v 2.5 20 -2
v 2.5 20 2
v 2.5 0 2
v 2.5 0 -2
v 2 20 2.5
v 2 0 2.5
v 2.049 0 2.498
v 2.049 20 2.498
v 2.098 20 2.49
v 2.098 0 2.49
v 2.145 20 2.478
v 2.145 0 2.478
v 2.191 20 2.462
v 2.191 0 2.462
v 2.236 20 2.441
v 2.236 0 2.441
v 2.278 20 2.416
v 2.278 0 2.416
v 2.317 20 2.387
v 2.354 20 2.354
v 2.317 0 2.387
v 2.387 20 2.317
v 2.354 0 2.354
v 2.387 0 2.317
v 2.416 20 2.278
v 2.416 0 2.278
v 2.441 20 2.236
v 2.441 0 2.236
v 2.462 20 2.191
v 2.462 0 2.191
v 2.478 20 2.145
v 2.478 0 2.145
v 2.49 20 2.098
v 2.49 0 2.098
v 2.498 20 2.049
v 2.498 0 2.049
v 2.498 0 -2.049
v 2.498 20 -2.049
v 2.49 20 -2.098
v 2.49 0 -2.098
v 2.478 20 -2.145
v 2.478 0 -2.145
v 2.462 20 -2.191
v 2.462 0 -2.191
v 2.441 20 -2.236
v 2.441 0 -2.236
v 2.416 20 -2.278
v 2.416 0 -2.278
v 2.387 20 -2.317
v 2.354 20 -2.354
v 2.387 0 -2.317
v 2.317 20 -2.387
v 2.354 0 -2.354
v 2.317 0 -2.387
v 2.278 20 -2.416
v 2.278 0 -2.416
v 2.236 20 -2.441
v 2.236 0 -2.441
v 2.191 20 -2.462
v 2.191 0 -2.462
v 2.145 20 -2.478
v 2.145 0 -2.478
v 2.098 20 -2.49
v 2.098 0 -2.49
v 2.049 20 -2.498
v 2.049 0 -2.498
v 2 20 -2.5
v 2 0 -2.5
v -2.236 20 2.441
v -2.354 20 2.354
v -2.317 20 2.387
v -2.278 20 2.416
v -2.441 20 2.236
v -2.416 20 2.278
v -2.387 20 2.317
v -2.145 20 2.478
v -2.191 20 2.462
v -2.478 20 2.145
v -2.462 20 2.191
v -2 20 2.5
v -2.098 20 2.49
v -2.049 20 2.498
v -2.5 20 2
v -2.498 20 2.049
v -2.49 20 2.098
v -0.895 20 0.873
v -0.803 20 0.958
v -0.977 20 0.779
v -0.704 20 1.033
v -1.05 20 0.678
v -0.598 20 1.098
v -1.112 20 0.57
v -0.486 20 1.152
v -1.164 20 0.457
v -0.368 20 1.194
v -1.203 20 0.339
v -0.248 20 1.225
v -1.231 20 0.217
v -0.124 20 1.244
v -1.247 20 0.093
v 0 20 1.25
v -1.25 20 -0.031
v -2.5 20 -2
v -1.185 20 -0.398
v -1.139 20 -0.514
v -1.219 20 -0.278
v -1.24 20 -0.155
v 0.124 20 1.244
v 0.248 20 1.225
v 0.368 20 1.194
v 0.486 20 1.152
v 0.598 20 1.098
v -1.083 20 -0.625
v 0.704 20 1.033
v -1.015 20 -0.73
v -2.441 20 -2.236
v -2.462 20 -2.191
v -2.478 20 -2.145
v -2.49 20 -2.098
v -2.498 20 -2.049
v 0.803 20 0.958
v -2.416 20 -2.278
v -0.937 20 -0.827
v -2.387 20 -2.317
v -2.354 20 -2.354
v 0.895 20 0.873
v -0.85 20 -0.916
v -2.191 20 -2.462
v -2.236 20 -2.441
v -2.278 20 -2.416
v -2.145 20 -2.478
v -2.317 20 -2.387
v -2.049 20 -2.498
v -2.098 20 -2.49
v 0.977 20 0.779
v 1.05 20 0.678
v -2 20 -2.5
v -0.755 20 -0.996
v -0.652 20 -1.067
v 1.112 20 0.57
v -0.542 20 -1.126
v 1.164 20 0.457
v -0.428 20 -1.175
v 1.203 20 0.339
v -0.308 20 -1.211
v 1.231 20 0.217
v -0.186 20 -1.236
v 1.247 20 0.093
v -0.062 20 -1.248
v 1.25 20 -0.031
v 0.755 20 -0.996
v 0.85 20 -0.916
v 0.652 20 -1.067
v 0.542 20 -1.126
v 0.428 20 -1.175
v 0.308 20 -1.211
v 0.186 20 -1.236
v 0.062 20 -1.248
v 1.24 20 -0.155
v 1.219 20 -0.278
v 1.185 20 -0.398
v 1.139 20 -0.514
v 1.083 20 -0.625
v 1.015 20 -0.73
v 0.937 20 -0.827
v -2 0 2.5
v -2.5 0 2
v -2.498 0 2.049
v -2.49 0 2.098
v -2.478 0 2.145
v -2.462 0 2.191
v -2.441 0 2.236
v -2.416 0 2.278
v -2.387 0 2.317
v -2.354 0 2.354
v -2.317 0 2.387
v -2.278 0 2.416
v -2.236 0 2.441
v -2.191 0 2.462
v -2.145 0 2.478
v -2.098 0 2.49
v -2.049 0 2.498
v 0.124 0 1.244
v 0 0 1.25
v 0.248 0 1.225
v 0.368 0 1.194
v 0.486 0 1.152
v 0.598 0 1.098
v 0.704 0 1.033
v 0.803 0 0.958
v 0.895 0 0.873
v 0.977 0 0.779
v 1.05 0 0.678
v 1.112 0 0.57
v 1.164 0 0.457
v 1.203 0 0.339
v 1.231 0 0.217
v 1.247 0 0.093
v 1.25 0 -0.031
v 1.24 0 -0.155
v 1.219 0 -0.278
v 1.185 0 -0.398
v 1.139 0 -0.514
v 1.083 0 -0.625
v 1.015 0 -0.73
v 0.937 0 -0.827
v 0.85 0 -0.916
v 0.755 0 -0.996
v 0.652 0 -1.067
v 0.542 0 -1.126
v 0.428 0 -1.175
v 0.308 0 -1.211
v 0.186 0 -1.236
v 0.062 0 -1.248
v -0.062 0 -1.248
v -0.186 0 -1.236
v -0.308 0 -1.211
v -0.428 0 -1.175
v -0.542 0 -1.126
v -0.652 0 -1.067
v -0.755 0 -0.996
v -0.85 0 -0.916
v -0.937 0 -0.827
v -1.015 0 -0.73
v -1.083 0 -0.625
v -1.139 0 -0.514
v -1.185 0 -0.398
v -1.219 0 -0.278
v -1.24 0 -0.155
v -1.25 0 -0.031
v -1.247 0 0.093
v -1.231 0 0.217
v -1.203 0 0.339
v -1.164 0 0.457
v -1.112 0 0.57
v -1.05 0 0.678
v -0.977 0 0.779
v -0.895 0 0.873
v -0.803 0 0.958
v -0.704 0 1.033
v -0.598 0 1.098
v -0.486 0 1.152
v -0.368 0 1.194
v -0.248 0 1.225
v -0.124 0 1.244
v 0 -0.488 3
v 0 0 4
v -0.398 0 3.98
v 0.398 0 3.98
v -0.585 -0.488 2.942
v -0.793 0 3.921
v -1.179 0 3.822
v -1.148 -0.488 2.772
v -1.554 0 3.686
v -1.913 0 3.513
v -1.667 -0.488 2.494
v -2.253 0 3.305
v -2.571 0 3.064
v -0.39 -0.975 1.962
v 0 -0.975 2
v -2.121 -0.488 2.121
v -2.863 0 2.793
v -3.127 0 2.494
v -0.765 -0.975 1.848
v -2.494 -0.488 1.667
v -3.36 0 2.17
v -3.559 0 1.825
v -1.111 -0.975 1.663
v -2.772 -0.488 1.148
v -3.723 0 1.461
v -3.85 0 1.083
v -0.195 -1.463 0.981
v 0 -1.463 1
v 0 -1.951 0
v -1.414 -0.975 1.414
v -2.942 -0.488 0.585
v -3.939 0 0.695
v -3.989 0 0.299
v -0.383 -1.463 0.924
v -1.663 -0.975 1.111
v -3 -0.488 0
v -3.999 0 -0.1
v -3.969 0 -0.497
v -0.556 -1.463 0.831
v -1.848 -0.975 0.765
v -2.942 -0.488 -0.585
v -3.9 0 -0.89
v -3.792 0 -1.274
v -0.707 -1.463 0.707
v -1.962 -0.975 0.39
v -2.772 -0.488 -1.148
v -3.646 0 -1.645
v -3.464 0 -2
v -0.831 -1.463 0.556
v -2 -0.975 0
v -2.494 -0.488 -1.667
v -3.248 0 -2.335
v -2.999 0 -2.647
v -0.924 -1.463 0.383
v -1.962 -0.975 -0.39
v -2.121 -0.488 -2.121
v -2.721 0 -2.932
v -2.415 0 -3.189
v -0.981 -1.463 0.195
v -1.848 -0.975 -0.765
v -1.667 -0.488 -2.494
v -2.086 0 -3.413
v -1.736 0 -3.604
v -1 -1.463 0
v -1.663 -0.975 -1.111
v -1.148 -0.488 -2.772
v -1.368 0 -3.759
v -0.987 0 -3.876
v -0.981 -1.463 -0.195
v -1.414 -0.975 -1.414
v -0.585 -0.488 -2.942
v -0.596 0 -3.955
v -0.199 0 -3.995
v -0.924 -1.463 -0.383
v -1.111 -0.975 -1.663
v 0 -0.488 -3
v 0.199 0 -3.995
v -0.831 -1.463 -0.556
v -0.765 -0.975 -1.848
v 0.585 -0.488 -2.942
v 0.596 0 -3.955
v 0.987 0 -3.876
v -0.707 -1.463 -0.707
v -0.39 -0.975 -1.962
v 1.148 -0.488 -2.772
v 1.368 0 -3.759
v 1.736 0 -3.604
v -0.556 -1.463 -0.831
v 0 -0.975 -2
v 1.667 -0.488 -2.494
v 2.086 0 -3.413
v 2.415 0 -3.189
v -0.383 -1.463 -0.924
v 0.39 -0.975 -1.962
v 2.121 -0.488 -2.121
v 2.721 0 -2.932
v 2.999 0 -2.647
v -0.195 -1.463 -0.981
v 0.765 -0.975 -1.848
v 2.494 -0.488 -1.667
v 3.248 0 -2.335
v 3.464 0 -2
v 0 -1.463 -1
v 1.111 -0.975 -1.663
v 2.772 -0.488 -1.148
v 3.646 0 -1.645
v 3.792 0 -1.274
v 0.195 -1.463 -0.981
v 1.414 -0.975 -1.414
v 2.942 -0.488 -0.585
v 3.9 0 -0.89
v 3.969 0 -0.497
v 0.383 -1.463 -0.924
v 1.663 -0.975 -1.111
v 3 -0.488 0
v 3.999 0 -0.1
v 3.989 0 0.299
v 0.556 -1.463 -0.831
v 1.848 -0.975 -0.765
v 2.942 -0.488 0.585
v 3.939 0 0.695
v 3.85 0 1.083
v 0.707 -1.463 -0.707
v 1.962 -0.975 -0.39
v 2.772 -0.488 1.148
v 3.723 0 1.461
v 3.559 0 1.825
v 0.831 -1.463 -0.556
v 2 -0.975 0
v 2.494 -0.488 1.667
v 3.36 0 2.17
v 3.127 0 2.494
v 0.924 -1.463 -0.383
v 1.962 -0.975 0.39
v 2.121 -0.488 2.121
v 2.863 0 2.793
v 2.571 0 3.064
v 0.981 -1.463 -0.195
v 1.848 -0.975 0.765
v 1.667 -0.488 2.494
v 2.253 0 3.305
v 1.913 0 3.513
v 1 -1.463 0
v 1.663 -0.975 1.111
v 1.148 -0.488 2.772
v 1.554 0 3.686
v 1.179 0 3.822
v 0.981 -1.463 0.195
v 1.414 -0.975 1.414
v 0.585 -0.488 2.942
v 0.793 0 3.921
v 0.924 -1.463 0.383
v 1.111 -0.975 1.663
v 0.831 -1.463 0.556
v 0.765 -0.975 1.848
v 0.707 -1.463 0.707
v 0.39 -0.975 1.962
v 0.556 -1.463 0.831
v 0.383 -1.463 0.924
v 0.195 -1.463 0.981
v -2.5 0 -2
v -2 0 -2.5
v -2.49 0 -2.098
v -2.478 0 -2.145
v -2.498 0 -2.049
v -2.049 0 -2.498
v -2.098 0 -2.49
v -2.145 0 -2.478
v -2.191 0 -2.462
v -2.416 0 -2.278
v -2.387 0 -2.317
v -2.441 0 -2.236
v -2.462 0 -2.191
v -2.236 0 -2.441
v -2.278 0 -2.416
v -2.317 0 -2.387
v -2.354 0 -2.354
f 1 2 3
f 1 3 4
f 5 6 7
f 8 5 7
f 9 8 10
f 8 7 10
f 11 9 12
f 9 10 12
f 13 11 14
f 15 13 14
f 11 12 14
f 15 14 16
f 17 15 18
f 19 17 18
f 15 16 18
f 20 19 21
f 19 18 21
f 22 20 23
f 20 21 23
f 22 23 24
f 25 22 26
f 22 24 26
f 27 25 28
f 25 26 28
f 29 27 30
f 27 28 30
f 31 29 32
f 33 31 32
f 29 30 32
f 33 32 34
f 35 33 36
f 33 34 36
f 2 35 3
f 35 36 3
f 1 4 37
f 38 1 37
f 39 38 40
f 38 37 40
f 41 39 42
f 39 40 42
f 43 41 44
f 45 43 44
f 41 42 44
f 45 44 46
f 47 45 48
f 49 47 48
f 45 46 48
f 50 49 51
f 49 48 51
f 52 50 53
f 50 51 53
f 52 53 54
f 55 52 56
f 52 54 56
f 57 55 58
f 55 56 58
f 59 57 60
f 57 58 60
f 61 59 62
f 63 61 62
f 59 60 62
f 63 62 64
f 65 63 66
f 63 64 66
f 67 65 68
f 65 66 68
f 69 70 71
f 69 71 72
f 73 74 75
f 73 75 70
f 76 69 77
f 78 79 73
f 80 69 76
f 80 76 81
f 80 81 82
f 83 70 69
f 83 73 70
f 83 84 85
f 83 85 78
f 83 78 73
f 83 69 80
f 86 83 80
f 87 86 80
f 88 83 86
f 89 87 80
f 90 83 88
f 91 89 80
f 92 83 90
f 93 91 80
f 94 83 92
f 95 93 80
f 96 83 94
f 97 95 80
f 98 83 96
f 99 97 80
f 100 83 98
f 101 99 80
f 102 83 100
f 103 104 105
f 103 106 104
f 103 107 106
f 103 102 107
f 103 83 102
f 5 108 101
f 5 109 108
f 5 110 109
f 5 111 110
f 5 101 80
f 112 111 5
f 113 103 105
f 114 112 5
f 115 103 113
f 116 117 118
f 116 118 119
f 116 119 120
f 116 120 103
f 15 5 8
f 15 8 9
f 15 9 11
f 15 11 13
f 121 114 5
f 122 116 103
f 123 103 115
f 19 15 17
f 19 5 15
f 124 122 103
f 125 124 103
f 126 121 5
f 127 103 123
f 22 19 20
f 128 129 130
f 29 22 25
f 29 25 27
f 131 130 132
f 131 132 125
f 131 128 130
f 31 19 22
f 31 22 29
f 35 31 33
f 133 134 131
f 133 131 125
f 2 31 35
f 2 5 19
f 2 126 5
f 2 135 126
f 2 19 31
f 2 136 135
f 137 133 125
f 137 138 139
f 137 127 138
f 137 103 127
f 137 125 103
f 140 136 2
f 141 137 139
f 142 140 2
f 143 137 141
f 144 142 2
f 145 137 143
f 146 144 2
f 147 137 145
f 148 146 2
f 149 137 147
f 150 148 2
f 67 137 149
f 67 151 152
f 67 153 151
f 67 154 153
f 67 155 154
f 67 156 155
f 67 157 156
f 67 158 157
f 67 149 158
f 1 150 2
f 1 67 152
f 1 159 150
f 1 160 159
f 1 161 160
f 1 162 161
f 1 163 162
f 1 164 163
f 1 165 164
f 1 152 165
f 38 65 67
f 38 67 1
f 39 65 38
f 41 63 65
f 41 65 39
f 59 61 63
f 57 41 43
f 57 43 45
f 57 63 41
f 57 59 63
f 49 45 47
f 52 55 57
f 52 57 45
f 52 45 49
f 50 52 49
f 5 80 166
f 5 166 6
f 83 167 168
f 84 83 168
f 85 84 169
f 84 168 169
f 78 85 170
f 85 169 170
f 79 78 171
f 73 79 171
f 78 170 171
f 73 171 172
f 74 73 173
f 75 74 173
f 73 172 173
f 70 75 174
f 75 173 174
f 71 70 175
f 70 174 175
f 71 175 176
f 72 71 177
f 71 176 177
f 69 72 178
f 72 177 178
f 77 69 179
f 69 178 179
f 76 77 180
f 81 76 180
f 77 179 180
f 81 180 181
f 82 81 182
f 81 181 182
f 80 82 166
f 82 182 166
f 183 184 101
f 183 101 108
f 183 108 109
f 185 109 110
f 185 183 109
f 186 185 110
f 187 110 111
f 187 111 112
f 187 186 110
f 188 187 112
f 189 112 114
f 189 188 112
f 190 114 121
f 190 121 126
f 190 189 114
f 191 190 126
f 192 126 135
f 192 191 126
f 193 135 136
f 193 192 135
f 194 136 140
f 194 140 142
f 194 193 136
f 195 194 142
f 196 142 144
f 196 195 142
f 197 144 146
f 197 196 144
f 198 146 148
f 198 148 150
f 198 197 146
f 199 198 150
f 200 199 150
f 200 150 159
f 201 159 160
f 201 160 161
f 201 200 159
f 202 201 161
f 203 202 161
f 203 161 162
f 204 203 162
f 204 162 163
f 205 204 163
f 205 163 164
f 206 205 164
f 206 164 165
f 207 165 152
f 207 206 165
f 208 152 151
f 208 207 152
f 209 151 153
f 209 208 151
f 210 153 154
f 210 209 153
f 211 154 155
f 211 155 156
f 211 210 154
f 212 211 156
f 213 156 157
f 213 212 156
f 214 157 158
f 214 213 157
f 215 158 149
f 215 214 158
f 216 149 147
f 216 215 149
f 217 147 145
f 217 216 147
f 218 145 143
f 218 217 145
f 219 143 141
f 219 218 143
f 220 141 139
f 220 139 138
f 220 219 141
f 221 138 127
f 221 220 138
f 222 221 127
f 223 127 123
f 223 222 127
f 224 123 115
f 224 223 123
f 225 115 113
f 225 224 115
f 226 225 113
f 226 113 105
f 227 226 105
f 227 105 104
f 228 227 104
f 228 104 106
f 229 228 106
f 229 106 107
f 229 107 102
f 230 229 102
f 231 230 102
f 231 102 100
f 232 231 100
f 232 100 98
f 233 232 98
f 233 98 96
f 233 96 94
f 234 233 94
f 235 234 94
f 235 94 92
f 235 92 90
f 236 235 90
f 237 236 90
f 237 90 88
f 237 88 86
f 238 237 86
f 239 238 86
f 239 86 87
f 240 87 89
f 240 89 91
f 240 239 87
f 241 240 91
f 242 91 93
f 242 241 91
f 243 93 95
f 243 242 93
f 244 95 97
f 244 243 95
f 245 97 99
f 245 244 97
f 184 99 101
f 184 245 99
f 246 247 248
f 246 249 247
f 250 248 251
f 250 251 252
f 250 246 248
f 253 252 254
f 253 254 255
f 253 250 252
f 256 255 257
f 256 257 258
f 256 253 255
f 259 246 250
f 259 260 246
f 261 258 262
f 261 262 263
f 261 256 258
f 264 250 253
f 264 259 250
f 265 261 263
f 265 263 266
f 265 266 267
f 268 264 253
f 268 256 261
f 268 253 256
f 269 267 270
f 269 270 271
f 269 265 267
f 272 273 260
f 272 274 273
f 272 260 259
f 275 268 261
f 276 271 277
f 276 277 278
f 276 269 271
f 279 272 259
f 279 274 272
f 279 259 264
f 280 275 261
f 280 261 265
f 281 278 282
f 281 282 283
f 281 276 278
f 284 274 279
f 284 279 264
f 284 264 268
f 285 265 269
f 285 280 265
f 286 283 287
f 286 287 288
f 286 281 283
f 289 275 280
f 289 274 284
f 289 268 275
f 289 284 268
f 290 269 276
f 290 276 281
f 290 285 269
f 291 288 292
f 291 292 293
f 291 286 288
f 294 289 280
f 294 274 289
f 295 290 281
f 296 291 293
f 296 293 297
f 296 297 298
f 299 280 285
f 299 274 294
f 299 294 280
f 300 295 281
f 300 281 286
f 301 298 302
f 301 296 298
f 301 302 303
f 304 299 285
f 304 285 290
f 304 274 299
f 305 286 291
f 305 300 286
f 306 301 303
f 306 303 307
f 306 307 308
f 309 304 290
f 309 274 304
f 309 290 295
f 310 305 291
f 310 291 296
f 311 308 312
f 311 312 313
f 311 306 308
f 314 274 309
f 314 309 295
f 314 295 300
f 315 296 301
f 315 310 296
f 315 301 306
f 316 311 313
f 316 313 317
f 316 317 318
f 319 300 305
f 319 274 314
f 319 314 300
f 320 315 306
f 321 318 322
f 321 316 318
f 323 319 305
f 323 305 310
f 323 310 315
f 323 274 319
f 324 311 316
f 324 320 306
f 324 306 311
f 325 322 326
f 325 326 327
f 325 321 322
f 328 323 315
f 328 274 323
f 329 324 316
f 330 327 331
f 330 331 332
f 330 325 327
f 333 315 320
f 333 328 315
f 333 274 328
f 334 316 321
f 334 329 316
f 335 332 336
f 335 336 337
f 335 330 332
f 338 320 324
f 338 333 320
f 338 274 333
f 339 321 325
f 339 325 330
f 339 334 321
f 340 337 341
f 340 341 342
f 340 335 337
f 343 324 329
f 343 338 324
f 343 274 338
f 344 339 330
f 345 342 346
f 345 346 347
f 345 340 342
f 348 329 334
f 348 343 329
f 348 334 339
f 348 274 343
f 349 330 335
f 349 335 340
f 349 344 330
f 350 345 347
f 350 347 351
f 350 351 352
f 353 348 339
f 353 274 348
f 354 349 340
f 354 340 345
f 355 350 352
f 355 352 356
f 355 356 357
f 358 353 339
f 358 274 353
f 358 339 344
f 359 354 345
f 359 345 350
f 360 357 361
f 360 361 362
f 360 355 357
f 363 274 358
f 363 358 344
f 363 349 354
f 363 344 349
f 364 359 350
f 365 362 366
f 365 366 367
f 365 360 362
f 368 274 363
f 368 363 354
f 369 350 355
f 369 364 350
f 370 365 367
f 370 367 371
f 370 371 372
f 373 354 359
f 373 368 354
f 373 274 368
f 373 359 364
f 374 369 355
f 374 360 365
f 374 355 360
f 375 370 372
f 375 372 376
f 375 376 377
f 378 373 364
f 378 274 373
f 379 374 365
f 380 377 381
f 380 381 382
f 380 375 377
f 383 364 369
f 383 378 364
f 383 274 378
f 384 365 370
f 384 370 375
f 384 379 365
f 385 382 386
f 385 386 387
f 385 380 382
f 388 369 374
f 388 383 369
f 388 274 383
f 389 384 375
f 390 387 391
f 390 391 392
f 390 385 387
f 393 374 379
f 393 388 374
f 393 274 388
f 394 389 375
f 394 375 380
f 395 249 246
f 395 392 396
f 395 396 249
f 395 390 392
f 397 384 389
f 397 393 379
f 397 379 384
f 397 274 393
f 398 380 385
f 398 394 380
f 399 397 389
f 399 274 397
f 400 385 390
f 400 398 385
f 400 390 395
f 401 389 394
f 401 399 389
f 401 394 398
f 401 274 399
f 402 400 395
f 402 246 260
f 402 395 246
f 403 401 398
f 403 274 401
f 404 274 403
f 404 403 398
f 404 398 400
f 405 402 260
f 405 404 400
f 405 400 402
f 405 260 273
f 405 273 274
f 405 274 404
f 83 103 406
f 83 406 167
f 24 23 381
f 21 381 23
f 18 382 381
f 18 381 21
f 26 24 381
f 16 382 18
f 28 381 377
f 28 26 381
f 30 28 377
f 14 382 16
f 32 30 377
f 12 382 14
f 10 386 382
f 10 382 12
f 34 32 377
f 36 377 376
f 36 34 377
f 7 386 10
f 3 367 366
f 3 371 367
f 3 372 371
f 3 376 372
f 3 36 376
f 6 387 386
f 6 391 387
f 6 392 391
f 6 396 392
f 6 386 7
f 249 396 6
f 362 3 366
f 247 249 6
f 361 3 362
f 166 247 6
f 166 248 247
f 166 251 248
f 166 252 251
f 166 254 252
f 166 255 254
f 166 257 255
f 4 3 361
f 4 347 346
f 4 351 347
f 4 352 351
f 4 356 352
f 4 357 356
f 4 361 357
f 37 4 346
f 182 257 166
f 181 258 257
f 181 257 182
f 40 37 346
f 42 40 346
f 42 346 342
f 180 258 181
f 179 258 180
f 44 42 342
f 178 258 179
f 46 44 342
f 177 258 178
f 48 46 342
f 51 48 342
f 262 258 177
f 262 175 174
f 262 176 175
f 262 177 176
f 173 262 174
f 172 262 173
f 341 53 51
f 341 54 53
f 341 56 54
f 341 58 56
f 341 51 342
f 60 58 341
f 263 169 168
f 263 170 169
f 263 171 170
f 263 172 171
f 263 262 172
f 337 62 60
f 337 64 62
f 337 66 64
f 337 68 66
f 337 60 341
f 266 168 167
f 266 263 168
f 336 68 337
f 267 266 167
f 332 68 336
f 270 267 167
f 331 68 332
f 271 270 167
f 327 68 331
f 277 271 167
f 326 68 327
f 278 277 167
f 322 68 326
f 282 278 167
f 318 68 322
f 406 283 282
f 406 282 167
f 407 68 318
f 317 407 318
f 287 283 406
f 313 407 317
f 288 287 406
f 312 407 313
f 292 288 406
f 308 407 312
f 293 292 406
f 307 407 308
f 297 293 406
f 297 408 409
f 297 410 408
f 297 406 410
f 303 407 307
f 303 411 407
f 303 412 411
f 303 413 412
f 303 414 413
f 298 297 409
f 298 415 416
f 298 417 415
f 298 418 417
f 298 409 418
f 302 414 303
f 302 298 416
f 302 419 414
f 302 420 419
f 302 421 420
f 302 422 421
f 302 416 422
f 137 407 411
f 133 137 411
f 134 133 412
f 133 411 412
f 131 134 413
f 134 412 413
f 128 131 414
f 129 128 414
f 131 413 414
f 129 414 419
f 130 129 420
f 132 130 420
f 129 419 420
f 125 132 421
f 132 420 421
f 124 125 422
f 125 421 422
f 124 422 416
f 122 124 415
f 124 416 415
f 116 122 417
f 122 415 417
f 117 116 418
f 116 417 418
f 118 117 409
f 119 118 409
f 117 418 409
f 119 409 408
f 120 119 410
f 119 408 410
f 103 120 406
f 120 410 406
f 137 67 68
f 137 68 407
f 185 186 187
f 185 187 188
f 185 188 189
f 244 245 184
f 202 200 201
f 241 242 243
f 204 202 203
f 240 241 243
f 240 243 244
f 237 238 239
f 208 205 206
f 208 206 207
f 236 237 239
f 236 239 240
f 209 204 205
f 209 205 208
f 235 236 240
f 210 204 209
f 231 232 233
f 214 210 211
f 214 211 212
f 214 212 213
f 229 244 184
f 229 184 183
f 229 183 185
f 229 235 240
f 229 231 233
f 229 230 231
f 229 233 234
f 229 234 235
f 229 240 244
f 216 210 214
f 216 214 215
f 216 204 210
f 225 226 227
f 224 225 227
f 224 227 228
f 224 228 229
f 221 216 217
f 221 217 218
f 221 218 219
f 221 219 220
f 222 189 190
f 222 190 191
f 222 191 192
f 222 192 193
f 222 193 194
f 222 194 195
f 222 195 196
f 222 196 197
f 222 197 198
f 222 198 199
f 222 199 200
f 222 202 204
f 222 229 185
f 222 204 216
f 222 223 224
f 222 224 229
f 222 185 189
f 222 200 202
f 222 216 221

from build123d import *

# Parameters (mm, degrees)
SKETCH_1_R      = 1.25
EXTRUDE_1_DEPTH = 20


with BuildPart() as part:
    # Эскиз1 → Бобышка-Вытянуть1 (new body)
    with BuildSketch(Plane(origin=(0, 0, 0), x_dir=(1, 0, 0), z_dir=(0, 1, 0))):
        with BuildLine():
            Line((-2, -2.5), (2, -2.5))
            ThreePointArc((2, -2.5), (2.353553391, -2.353553391), (2.5, -2))
            Line((2.5, -2), (2.5, 2))
            ThreePointArc((2.5, 2), (2.353553391, 2.353553391), (2, 2.5))
            Line((2, 2.5), (-2, 2.5))
            ThreePointArc((-2, 2.5), (-2.353553391, 2.353553391), (-2.5, 2))
            Line((-2.5, 2), (-2.5, -2))
            ThreePointArc((-2.5, -2), (-2.353553391, -2.353553391), (-2, -2.5))
        make_face()
        with Locations(Location((0, 0, 0), (0, 0, 270))):
            Circle(SKETCH_1_R, mode=Mode.SUBTRACT)
    extrude(amount=EXTRUDE_1_DEPTH)

    # Бобышка-Вытянуть2 cone 1 section (through the dimple's axis) → Бобышка-Вытянуть2 (revolve)
    with BuildSketch(Plane(origin=(0, 0, 0), x_dir=(0, 0, 1), z_dir=(1, 0, 0))):
        Polygon((0, 0), (4, 0), (0, 1.950930354), align=None)
    revolve(axis=Axis((0, 0, 0), (0, -1, 0)))


solid = part.part
